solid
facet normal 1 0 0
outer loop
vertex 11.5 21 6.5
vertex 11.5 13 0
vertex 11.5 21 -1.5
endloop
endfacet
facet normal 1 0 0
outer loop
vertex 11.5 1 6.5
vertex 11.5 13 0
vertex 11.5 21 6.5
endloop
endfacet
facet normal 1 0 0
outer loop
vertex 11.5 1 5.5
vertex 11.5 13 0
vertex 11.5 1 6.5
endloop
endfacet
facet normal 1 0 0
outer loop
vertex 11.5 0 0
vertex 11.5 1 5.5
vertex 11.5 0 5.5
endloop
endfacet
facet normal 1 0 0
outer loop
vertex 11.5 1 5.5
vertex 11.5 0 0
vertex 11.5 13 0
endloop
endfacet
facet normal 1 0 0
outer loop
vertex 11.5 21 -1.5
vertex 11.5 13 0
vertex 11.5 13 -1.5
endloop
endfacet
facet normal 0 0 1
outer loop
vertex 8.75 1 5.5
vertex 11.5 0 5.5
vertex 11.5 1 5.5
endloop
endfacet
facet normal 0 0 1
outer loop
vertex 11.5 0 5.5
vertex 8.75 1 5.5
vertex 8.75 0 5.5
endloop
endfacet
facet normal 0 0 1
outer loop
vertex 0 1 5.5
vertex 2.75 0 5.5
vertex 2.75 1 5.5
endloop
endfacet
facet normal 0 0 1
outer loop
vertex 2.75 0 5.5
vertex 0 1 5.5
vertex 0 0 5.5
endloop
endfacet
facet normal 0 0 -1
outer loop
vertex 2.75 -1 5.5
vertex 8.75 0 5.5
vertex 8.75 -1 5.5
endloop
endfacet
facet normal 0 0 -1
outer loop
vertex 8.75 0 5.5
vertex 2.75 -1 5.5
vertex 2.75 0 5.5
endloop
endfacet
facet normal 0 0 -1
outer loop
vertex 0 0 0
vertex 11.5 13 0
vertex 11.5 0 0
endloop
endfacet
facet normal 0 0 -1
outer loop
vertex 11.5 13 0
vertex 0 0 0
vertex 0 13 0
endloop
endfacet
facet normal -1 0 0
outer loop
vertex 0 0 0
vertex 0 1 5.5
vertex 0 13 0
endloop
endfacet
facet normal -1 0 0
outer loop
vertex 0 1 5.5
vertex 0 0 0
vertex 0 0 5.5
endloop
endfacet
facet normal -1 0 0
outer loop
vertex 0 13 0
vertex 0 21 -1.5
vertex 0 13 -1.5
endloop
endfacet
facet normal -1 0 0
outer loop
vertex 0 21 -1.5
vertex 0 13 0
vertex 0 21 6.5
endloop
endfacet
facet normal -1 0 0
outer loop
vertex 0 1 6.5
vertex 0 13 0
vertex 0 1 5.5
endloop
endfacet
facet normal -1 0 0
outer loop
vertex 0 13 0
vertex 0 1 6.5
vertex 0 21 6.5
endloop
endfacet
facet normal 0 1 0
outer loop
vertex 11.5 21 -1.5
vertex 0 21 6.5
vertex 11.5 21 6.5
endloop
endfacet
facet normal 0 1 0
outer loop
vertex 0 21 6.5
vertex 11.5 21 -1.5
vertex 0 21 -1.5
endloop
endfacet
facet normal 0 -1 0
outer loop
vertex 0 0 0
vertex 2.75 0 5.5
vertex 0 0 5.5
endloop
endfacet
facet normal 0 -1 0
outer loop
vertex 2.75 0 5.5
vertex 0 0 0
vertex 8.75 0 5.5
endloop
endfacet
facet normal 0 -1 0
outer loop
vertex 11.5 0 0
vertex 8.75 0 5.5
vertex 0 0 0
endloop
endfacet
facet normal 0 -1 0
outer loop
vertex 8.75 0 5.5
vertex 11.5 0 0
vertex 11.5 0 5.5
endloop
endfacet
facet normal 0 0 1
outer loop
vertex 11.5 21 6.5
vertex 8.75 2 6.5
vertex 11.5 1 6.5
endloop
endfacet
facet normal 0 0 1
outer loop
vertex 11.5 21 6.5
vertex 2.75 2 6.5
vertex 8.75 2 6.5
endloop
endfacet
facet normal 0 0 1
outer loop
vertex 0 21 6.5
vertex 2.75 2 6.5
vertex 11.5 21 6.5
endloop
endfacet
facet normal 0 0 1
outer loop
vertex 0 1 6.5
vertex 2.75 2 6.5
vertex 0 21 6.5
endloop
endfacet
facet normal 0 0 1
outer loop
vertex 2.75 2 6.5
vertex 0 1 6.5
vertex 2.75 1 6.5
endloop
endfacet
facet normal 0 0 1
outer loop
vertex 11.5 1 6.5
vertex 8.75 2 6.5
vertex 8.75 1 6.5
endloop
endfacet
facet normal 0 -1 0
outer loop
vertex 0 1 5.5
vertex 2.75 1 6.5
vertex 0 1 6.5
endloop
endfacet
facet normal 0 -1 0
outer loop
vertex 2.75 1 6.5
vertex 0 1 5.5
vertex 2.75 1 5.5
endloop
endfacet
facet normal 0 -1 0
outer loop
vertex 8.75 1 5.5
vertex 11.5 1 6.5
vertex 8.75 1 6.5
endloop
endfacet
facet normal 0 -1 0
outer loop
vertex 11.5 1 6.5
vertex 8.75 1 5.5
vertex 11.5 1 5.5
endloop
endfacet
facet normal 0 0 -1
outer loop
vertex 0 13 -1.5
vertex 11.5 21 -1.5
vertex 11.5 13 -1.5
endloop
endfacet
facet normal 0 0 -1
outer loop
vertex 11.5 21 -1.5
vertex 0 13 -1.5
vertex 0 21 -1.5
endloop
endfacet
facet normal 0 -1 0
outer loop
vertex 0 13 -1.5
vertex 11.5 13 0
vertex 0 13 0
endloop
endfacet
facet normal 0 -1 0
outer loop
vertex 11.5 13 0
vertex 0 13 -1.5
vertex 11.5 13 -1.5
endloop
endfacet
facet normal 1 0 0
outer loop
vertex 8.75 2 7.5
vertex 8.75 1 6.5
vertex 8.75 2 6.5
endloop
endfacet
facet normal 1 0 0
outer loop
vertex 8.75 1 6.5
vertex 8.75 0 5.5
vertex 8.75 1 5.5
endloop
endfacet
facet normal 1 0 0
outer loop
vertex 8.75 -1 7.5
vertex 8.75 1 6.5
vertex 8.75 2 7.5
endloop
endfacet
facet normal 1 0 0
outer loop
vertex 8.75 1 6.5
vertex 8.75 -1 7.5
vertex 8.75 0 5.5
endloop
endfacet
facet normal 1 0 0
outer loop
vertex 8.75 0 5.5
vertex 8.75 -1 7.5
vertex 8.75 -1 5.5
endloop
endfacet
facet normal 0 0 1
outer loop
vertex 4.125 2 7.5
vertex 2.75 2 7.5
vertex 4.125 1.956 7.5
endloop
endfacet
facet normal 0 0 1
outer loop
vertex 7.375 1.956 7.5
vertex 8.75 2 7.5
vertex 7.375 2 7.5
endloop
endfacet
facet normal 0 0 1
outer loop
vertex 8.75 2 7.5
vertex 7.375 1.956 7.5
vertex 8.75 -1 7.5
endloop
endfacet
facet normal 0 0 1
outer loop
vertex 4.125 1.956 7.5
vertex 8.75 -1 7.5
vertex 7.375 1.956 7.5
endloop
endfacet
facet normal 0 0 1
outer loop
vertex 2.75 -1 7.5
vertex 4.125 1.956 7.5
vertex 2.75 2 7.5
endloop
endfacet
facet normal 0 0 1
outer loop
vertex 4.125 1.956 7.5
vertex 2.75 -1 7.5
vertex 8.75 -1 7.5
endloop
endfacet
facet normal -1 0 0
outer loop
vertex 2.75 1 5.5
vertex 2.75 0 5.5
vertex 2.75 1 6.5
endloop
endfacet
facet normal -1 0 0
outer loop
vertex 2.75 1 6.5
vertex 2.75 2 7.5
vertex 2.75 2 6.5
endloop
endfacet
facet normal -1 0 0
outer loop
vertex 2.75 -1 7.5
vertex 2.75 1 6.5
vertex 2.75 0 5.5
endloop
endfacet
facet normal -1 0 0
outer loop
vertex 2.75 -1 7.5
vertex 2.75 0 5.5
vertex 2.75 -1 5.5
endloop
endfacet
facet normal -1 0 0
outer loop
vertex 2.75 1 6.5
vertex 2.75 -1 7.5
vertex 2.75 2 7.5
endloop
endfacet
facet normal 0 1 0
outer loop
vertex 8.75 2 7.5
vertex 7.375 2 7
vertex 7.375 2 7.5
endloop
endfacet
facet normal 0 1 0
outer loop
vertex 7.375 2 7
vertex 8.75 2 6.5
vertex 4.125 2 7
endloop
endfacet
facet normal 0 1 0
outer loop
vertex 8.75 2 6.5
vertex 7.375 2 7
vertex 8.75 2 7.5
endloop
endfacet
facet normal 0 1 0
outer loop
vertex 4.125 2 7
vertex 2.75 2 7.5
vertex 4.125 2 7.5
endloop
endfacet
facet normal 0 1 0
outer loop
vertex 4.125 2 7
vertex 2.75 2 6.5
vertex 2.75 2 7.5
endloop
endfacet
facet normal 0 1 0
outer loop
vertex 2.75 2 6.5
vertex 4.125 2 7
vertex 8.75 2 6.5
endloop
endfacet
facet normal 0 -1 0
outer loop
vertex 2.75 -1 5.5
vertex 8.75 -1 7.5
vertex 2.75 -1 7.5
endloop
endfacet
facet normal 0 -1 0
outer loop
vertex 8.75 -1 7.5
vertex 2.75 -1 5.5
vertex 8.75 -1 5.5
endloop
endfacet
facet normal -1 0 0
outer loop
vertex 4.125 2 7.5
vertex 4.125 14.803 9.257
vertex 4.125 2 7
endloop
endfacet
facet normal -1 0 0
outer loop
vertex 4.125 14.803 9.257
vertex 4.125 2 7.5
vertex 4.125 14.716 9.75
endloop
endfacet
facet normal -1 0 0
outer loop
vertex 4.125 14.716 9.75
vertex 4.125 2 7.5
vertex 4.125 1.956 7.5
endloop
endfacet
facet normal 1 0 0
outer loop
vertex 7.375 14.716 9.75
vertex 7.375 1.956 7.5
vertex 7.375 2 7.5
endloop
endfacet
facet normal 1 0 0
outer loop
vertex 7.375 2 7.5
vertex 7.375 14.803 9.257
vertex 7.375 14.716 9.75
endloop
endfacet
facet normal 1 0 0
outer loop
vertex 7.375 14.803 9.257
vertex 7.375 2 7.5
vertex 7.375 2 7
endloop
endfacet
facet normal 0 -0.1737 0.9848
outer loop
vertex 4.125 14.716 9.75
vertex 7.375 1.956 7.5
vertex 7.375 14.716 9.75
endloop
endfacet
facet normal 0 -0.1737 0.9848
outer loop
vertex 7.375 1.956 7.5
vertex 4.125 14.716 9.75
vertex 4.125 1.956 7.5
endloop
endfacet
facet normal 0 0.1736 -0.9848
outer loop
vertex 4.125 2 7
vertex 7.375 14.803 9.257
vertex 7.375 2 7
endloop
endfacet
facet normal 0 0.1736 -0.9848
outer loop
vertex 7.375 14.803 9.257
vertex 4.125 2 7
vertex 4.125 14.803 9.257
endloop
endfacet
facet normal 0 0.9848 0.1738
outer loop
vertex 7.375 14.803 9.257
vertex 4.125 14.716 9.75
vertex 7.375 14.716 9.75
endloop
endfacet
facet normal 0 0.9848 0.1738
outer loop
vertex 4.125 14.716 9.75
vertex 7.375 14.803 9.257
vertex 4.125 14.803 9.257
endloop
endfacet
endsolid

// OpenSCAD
base_height = 5.5;
base_depth = 21.0;
base_width = 11.5;
module base() {
    cube([base_width, base_depth, base_height]);
}

top_height = 1.0;
top_depth = 20.0;
top_width = base_width;
module top() {
    translate([0, 1, base_height]) {
        cube([top_width, top_depth, top_height]);
    }
}

bottom_height = 1.5;
bottom_depth = 8.0;
bottom_width = base_width;
module bottom() {
    translate([0, base_depth - bottom_depth, -bottom_height]) {
        cube([bottom_width, bottom_depth, bottom_height]);
    }
}

clipbase_height = 2.0;
clipbase_depth = 3.0;
clipbase_width = 6.0;
clipbase_xoff = base_width/2 - clipbase_width/2;
module clipbase() {
    translate([clipbase_xoff, -1, base_height]) {
        cube([clipbase_width, clipbase_depth, clipbase_height]);
    }
}

clip_height = 0.5;
clip_depth = 13.0;
clip_width = 3.25;
clip_xoff = base_width/2 - clip_width/2;
clip_zoff = base_height + clipbase_height - clip_height;
module clip() {
    translate([clip_xoff, 2, clip_zoff]) {
        rotate([10, 0, 0]) {
            cube([clip_width, clip_depth, clip_height]);
        }
    }
}

color("grey", 0.5) union() {
    base();
    top();
    bottom();
    clipbase();
    clip();
}
